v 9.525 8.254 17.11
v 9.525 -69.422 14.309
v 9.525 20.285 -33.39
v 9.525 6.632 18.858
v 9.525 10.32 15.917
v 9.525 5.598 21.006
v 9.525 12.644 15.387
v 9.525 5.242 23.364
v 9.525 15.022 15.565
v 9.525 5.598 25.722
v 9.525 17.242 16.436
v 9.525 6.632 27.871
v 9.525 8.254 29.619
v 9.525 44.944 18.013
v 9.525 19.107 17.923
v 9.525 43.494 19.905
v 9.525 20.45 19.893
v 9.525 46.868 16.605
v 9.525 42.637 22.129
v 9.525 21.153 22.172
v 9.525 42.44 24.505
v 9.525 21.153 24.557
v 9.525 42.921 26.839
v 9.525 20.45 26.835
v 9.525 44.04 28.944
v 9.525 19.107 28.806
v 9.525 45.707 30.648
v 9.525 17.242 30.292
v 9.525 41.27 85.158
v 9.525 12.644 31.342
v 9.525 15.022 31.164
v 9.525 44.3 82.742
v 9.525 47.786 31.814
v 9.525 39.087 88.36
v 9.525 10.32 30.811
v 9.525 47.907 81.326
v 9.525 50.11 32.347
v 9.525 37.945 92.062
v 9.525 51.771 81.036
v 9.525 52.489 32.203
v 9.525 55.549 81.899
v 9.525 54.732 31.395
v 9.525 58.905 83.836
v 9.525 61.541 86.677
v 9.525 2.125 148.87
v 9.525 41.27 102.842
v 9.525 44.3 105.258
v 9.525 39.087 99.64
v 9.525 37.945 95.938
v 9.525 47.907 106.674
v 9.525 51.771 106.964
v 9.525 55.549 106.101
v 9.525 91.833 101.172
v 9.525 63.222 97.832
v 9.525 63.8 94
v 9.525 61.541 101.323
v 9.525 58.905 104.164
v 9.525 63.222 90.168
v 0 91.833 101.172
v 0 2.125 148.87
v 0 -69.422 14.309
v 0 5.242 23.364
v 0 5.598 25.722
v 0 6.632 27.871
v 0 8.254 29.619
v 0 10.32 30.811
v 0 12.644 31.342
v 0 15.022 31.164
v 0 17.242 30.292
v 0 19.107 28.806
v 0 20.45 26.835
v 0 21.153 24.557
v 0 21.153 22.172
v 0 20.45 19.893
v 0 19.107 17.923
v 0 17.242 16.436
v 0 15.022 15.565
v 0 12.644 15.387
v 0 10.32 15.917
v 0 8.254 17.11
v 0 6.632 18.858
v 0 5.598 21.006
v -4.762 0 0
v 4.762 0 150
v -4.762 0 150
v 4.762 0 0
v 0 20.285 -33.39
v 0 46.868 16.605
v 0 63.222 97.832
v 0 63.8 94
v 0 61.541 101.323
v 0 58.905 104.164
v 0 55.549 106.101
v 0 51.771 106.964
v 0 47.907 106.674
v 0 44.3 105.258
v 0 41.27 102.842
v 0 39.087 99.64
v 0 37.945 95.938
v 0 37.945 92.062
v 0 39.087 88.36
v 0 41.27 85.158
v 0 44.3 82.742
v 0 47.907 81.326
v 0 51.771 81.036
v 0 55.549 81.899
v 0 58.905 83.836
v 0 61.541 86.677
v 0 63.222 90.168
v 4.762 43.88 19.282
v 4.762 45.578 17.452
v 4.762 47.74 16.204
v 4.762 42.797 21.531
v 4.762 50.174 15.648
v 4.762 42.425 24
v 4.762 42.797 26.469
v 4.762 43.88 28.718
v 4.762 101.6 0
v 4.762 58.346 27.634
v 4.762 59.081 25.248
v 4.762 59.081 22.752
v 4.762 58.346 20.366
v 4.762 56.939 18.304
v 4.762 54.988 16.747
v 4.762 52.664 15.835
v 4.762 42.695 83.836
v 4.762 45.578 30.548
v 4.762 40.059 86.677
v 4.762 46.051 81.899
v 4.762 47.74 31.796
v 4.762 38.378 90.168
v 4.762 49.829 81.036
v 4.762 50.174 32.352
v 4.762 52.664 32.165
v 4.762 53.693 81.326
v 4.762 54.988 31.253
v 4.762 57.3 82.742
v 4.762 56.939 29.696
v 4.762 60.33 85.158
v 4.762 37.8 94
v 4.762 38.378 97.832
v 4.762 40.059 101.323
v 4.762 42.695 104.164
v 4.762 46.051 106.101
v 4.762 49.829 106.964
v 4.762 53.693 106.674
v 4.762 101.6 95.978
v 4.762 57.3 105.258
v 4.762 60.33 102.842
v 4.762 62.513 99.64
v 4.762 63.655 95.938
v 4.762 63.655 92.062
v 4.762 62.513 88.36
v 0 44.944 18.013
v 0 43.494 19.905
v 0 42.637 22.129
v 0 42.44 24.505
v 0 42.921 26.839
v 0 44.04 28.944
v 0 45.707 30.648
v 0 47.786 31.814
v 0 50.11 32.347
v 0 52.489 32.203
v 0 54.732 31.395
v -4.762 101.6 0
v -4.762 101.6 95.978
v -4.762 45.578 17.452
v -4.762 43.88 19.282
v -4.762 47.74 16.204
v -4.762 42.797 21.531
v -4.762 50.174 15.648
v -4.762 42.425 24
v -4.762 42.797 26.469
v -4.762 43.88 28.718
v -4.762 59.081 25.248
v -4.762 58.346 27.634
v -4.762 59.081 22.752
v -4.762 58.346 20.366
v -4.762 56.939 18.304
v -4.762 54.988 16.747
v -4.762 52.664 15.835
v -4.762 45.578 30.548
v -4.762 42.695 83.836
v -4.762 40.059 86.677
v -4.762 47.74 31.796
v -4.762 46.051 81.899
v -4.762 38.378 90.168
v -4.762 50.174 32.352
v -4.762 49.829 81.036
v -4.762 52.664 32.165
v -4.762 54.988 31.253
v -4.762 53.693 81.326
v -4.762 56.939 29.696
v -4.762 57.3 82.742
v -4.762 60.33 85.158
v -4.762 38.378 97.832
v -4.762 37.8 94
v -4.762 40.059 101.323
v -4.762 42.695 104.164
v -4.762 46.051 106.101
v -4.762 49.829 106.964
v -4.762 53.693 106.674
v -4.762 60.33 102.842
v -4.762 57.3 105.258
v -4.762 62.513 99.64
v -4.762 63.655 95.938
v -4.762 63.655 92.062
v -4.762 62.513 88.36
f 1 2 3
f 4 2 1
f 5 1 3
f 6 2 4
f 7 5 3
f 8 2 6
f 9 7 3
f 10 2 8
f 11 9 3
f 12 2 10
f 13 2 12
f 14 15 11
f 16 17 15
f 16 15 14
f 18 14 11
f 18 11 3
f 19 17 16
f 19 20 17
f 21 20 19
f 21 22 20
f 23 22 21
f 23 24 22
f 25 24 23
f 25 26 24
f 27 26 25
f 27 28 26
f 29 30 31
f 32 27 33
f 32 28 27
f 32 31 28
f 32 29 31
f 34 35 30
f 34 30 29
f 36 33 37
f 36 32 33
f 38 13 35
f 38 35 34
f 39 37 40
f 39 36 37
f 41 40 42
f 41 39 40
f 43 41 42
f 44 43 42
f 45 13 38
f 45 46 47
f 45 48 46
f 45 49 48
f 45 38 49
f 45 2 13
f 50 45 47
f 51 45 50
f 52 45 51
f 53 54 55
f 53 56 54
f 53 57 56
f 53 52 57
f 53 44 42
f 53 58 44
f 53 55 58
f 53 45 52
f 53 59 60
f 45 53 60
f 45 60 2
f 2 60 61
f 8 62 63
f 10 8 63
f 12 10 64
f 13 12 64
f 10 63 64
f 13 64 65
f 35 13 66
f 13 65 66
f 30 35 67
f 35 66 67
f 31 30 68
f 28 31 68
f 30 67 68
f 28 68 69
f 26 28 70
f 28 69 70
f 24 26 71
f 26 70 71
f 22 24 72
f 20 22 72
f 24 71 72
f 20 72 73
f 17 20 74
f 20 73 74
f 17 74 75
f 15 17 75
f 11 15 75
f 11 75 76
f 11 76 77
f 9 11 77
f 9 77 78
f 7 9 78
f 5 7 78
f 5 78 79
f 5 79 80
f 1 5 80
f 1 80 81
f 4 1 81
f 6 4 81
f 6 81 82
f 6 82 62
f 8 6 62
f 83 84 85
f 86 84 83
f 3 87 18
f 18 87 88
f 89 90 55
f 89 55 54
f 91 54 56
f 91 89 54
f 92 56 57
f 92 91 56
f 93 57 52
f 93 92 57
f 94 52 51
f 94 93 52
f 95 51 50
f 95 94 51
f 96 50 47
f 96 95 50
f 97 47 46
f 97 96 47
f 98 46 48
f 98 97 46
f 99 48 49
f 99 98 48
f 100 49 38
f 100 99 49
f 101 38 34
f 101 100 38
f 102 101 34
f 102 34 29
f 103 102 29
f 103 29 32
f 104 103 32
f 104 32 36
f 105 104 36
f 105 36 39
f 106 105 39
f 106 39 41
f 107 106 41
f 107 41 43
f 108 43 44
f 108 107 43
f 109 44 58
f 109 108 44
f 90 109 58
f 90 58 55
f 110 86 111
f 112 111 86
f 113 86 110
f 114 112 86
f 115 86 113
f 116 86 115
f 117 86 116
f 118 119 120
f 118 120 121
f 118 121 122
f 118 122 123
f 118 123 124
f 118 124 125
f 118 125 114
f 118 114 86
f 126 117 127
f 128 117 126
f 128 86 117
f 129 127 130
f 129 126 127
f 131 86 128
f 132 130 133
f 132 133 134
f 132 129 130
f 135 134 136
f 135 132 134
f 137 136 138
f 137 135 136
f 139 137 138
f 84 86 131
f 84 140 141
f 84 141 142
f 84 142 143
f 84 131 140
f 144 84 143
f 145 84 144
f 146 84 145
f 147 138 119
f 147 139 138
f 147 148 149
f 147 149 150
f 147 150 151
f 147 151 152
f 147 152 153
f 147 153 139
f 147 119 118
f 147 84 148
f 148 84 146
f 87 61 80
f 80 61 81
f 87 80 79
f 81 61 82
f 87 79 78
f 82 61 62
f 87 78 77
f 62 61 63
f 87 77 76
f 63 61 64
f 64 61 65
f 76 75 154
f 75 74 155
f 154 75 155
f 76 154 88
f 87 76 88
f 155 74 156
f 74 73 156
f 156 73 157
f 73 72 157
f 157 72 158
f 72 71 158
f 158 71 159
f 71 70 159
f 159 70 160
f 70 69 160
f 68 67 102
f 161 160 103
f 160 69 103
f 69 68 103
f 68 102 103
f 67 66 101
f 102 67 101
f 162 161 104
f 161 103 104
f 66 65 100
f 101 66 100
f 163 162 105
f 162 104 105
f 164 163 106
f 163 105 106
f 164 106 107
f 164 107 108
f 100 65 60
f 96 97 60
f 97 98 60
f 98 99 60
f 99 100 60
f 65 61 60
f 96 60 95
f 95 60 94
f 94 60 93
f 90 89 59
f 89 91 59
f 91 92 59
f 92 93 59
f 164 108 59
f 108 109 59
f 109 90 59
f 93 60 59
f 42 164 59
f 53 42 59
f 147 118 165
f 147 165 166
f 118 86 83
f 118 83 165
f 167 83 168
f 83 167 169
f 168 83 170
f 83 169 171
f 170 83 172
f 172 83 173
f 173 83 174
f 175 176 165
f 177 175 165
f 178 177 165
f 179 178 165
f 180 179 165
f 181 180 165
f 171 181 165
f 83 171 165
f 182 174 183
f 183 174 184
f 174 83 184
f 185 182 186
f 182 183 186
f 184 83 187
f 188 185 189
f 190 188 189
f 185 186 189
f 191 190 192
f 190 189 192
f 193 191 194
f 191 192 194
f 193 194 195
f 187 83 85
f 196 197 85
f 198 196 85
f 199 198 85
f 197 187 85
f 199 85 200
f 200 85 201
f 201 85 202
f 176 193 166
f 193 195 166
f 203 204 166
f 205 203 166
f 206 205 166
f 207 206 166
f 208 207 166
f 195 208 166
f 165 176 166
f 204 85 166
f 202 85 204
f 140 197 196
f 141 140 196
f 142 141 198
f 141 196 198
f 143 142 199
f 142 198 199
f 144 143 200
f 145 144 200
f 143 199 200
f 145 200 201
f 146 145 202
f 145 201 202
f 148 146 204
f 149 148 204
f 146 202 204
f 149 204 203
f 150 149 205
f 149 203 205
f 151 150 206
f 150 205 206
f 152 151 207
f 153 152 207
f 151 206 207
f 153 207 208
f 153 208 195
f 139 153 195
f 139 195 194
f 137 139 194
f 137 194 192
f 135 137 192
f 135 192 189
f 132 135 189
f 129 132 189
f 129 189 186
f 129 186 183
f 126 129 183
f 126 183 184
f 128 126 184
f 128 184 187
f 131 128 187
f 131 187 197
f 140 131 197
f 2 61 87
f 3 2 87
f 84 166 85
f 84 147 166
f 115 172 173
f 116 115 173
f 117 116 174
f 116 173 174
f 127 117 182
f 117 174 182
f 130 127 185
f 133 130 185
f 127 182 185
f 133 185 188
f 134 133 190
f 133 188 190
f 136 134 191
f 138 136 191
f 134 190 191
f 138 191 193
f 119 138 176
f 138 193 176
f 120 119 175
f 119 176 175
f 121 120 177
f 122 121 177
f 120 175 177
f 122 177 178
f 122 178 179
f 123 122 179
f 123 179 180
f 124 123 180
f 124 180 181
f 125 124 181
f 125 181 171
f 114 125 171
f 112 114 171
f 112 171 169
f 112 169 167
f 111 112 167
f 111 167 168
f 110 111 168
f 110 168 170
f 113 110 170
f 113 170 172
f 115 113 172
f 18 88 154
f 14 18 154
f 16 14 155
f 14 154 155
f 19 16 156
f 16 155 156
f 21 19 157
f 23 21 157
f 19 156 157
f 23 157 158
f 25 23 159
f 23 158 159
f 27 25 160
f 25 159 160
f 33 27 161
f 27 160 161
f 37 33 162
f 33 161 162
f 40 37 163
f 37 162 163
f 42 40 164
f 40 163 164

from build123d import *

# Parameters (mm, degrees)
F1_DEPTH = 4.7625
F3_D     = 16.75
F4_D     = 26
F5_R     = 13
F6_DEPTH = 9.525
F8_D     = 16


with BuildPart() as f1:
    # F0 (on Right) → F1 (new body, symmetric)
    with BuildSketch(Plane.YZ):
        Polygon((0, 150), (0, 0), (101.6, 0), (101.6, 95.9783217432), align=None)
    extrude(amount=F1_DEPTH, both=True)

    # F3 (through all)
    with Locations(Plane.YZ.offset(4.7625)):
        with Locations((50.8, 24)):
            Hole(F3_D / 2)

    # F4 (through all)
    with Locations(Plane.YZ.offset(4.7625)):
        with Locations((50.8, 94)):
            Hole(F4_D / 2)


with BuildPart() as f6:
    # F5 (on Right) → F6 (new body)
    with BuildSketch(Plane.YZ):
        with BuildLine():
            Line((91.8328668191, 101.1715985758), (2.1253913847, 148.8699093548))
            Line((2.1253913847, 148.8699093548), (-69.4220747839, 14.3086962031))
            Line((-69.4220747839, 14.3086962031), (20.2854006506, -33.3896145759))
            Line((20.2854006506, -33.3896145759), (46.8681756617, 16.6053139098))
            ThreePointArc((46.8681756617, 16.6053139098), (43.4053139098, 27.9318243383), (54.7318243383, 31.3946860902))
            Line((54.7318243383, 31.3946860902), (91.8328668191, 101.1715985758))
        make_face()
        with Locations((50.8, 94)):
            Circle(F5_R, mode=Mode.SUBTRACT)
    extrude(amount=F6_DEPTH)

    # F8 (through all)
    with Locations(Plane.YZ.offset(9.525)):
        with Locations((13.2422749771, 23.3641925713)):
            Hole(F8_D / 2)


solid = Compound([f1.part, f6.part])
